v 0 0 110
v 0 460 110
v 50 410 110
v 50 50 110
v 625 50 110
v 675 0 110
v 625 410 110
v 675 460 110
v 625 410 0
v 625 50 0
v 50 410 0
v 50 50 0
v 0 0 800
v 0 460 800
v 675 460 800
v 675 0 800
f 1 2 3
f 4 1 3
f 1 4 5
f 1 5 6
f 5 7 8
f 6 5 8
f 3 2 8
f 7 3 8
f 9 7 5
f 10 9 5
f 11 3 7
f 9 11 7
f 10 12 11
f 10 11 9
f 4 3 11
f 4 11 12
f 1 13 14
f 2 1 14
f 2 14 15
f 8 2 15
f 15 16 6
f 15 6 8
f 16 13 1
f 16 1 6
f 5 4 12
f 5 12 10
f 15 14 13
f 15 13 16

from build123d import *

# Parameters (mm, degrees)
F1_W     = 675
F1_H     = 460
F2_DEPTH = 690
F3_W     = 575
F3_H     = 360
F4_DEPTH = 110


with BuildPart() as f2:
    # F1 (on offset) → F2 (new body, through all)
    with BuildSketch(Plane.XY.offset(800)):
        with Locations((337.5, 230)):
            Rectangle(F1_W, F1_H)
    extrude(amount=-F2_DEPTH)

    # F3 (on face) → F4 (join, through all)
    with BuildSketch(Plane(origin=(0, 0, 110), x_dir=(1, 0, 0), z_dir=(0, 0, -1))):
        with Locations((337.5, -230)):
            Rectangle(F3_W, F3_H)
    extrude(amount=F4_DEPTH)


solid = f2.part
